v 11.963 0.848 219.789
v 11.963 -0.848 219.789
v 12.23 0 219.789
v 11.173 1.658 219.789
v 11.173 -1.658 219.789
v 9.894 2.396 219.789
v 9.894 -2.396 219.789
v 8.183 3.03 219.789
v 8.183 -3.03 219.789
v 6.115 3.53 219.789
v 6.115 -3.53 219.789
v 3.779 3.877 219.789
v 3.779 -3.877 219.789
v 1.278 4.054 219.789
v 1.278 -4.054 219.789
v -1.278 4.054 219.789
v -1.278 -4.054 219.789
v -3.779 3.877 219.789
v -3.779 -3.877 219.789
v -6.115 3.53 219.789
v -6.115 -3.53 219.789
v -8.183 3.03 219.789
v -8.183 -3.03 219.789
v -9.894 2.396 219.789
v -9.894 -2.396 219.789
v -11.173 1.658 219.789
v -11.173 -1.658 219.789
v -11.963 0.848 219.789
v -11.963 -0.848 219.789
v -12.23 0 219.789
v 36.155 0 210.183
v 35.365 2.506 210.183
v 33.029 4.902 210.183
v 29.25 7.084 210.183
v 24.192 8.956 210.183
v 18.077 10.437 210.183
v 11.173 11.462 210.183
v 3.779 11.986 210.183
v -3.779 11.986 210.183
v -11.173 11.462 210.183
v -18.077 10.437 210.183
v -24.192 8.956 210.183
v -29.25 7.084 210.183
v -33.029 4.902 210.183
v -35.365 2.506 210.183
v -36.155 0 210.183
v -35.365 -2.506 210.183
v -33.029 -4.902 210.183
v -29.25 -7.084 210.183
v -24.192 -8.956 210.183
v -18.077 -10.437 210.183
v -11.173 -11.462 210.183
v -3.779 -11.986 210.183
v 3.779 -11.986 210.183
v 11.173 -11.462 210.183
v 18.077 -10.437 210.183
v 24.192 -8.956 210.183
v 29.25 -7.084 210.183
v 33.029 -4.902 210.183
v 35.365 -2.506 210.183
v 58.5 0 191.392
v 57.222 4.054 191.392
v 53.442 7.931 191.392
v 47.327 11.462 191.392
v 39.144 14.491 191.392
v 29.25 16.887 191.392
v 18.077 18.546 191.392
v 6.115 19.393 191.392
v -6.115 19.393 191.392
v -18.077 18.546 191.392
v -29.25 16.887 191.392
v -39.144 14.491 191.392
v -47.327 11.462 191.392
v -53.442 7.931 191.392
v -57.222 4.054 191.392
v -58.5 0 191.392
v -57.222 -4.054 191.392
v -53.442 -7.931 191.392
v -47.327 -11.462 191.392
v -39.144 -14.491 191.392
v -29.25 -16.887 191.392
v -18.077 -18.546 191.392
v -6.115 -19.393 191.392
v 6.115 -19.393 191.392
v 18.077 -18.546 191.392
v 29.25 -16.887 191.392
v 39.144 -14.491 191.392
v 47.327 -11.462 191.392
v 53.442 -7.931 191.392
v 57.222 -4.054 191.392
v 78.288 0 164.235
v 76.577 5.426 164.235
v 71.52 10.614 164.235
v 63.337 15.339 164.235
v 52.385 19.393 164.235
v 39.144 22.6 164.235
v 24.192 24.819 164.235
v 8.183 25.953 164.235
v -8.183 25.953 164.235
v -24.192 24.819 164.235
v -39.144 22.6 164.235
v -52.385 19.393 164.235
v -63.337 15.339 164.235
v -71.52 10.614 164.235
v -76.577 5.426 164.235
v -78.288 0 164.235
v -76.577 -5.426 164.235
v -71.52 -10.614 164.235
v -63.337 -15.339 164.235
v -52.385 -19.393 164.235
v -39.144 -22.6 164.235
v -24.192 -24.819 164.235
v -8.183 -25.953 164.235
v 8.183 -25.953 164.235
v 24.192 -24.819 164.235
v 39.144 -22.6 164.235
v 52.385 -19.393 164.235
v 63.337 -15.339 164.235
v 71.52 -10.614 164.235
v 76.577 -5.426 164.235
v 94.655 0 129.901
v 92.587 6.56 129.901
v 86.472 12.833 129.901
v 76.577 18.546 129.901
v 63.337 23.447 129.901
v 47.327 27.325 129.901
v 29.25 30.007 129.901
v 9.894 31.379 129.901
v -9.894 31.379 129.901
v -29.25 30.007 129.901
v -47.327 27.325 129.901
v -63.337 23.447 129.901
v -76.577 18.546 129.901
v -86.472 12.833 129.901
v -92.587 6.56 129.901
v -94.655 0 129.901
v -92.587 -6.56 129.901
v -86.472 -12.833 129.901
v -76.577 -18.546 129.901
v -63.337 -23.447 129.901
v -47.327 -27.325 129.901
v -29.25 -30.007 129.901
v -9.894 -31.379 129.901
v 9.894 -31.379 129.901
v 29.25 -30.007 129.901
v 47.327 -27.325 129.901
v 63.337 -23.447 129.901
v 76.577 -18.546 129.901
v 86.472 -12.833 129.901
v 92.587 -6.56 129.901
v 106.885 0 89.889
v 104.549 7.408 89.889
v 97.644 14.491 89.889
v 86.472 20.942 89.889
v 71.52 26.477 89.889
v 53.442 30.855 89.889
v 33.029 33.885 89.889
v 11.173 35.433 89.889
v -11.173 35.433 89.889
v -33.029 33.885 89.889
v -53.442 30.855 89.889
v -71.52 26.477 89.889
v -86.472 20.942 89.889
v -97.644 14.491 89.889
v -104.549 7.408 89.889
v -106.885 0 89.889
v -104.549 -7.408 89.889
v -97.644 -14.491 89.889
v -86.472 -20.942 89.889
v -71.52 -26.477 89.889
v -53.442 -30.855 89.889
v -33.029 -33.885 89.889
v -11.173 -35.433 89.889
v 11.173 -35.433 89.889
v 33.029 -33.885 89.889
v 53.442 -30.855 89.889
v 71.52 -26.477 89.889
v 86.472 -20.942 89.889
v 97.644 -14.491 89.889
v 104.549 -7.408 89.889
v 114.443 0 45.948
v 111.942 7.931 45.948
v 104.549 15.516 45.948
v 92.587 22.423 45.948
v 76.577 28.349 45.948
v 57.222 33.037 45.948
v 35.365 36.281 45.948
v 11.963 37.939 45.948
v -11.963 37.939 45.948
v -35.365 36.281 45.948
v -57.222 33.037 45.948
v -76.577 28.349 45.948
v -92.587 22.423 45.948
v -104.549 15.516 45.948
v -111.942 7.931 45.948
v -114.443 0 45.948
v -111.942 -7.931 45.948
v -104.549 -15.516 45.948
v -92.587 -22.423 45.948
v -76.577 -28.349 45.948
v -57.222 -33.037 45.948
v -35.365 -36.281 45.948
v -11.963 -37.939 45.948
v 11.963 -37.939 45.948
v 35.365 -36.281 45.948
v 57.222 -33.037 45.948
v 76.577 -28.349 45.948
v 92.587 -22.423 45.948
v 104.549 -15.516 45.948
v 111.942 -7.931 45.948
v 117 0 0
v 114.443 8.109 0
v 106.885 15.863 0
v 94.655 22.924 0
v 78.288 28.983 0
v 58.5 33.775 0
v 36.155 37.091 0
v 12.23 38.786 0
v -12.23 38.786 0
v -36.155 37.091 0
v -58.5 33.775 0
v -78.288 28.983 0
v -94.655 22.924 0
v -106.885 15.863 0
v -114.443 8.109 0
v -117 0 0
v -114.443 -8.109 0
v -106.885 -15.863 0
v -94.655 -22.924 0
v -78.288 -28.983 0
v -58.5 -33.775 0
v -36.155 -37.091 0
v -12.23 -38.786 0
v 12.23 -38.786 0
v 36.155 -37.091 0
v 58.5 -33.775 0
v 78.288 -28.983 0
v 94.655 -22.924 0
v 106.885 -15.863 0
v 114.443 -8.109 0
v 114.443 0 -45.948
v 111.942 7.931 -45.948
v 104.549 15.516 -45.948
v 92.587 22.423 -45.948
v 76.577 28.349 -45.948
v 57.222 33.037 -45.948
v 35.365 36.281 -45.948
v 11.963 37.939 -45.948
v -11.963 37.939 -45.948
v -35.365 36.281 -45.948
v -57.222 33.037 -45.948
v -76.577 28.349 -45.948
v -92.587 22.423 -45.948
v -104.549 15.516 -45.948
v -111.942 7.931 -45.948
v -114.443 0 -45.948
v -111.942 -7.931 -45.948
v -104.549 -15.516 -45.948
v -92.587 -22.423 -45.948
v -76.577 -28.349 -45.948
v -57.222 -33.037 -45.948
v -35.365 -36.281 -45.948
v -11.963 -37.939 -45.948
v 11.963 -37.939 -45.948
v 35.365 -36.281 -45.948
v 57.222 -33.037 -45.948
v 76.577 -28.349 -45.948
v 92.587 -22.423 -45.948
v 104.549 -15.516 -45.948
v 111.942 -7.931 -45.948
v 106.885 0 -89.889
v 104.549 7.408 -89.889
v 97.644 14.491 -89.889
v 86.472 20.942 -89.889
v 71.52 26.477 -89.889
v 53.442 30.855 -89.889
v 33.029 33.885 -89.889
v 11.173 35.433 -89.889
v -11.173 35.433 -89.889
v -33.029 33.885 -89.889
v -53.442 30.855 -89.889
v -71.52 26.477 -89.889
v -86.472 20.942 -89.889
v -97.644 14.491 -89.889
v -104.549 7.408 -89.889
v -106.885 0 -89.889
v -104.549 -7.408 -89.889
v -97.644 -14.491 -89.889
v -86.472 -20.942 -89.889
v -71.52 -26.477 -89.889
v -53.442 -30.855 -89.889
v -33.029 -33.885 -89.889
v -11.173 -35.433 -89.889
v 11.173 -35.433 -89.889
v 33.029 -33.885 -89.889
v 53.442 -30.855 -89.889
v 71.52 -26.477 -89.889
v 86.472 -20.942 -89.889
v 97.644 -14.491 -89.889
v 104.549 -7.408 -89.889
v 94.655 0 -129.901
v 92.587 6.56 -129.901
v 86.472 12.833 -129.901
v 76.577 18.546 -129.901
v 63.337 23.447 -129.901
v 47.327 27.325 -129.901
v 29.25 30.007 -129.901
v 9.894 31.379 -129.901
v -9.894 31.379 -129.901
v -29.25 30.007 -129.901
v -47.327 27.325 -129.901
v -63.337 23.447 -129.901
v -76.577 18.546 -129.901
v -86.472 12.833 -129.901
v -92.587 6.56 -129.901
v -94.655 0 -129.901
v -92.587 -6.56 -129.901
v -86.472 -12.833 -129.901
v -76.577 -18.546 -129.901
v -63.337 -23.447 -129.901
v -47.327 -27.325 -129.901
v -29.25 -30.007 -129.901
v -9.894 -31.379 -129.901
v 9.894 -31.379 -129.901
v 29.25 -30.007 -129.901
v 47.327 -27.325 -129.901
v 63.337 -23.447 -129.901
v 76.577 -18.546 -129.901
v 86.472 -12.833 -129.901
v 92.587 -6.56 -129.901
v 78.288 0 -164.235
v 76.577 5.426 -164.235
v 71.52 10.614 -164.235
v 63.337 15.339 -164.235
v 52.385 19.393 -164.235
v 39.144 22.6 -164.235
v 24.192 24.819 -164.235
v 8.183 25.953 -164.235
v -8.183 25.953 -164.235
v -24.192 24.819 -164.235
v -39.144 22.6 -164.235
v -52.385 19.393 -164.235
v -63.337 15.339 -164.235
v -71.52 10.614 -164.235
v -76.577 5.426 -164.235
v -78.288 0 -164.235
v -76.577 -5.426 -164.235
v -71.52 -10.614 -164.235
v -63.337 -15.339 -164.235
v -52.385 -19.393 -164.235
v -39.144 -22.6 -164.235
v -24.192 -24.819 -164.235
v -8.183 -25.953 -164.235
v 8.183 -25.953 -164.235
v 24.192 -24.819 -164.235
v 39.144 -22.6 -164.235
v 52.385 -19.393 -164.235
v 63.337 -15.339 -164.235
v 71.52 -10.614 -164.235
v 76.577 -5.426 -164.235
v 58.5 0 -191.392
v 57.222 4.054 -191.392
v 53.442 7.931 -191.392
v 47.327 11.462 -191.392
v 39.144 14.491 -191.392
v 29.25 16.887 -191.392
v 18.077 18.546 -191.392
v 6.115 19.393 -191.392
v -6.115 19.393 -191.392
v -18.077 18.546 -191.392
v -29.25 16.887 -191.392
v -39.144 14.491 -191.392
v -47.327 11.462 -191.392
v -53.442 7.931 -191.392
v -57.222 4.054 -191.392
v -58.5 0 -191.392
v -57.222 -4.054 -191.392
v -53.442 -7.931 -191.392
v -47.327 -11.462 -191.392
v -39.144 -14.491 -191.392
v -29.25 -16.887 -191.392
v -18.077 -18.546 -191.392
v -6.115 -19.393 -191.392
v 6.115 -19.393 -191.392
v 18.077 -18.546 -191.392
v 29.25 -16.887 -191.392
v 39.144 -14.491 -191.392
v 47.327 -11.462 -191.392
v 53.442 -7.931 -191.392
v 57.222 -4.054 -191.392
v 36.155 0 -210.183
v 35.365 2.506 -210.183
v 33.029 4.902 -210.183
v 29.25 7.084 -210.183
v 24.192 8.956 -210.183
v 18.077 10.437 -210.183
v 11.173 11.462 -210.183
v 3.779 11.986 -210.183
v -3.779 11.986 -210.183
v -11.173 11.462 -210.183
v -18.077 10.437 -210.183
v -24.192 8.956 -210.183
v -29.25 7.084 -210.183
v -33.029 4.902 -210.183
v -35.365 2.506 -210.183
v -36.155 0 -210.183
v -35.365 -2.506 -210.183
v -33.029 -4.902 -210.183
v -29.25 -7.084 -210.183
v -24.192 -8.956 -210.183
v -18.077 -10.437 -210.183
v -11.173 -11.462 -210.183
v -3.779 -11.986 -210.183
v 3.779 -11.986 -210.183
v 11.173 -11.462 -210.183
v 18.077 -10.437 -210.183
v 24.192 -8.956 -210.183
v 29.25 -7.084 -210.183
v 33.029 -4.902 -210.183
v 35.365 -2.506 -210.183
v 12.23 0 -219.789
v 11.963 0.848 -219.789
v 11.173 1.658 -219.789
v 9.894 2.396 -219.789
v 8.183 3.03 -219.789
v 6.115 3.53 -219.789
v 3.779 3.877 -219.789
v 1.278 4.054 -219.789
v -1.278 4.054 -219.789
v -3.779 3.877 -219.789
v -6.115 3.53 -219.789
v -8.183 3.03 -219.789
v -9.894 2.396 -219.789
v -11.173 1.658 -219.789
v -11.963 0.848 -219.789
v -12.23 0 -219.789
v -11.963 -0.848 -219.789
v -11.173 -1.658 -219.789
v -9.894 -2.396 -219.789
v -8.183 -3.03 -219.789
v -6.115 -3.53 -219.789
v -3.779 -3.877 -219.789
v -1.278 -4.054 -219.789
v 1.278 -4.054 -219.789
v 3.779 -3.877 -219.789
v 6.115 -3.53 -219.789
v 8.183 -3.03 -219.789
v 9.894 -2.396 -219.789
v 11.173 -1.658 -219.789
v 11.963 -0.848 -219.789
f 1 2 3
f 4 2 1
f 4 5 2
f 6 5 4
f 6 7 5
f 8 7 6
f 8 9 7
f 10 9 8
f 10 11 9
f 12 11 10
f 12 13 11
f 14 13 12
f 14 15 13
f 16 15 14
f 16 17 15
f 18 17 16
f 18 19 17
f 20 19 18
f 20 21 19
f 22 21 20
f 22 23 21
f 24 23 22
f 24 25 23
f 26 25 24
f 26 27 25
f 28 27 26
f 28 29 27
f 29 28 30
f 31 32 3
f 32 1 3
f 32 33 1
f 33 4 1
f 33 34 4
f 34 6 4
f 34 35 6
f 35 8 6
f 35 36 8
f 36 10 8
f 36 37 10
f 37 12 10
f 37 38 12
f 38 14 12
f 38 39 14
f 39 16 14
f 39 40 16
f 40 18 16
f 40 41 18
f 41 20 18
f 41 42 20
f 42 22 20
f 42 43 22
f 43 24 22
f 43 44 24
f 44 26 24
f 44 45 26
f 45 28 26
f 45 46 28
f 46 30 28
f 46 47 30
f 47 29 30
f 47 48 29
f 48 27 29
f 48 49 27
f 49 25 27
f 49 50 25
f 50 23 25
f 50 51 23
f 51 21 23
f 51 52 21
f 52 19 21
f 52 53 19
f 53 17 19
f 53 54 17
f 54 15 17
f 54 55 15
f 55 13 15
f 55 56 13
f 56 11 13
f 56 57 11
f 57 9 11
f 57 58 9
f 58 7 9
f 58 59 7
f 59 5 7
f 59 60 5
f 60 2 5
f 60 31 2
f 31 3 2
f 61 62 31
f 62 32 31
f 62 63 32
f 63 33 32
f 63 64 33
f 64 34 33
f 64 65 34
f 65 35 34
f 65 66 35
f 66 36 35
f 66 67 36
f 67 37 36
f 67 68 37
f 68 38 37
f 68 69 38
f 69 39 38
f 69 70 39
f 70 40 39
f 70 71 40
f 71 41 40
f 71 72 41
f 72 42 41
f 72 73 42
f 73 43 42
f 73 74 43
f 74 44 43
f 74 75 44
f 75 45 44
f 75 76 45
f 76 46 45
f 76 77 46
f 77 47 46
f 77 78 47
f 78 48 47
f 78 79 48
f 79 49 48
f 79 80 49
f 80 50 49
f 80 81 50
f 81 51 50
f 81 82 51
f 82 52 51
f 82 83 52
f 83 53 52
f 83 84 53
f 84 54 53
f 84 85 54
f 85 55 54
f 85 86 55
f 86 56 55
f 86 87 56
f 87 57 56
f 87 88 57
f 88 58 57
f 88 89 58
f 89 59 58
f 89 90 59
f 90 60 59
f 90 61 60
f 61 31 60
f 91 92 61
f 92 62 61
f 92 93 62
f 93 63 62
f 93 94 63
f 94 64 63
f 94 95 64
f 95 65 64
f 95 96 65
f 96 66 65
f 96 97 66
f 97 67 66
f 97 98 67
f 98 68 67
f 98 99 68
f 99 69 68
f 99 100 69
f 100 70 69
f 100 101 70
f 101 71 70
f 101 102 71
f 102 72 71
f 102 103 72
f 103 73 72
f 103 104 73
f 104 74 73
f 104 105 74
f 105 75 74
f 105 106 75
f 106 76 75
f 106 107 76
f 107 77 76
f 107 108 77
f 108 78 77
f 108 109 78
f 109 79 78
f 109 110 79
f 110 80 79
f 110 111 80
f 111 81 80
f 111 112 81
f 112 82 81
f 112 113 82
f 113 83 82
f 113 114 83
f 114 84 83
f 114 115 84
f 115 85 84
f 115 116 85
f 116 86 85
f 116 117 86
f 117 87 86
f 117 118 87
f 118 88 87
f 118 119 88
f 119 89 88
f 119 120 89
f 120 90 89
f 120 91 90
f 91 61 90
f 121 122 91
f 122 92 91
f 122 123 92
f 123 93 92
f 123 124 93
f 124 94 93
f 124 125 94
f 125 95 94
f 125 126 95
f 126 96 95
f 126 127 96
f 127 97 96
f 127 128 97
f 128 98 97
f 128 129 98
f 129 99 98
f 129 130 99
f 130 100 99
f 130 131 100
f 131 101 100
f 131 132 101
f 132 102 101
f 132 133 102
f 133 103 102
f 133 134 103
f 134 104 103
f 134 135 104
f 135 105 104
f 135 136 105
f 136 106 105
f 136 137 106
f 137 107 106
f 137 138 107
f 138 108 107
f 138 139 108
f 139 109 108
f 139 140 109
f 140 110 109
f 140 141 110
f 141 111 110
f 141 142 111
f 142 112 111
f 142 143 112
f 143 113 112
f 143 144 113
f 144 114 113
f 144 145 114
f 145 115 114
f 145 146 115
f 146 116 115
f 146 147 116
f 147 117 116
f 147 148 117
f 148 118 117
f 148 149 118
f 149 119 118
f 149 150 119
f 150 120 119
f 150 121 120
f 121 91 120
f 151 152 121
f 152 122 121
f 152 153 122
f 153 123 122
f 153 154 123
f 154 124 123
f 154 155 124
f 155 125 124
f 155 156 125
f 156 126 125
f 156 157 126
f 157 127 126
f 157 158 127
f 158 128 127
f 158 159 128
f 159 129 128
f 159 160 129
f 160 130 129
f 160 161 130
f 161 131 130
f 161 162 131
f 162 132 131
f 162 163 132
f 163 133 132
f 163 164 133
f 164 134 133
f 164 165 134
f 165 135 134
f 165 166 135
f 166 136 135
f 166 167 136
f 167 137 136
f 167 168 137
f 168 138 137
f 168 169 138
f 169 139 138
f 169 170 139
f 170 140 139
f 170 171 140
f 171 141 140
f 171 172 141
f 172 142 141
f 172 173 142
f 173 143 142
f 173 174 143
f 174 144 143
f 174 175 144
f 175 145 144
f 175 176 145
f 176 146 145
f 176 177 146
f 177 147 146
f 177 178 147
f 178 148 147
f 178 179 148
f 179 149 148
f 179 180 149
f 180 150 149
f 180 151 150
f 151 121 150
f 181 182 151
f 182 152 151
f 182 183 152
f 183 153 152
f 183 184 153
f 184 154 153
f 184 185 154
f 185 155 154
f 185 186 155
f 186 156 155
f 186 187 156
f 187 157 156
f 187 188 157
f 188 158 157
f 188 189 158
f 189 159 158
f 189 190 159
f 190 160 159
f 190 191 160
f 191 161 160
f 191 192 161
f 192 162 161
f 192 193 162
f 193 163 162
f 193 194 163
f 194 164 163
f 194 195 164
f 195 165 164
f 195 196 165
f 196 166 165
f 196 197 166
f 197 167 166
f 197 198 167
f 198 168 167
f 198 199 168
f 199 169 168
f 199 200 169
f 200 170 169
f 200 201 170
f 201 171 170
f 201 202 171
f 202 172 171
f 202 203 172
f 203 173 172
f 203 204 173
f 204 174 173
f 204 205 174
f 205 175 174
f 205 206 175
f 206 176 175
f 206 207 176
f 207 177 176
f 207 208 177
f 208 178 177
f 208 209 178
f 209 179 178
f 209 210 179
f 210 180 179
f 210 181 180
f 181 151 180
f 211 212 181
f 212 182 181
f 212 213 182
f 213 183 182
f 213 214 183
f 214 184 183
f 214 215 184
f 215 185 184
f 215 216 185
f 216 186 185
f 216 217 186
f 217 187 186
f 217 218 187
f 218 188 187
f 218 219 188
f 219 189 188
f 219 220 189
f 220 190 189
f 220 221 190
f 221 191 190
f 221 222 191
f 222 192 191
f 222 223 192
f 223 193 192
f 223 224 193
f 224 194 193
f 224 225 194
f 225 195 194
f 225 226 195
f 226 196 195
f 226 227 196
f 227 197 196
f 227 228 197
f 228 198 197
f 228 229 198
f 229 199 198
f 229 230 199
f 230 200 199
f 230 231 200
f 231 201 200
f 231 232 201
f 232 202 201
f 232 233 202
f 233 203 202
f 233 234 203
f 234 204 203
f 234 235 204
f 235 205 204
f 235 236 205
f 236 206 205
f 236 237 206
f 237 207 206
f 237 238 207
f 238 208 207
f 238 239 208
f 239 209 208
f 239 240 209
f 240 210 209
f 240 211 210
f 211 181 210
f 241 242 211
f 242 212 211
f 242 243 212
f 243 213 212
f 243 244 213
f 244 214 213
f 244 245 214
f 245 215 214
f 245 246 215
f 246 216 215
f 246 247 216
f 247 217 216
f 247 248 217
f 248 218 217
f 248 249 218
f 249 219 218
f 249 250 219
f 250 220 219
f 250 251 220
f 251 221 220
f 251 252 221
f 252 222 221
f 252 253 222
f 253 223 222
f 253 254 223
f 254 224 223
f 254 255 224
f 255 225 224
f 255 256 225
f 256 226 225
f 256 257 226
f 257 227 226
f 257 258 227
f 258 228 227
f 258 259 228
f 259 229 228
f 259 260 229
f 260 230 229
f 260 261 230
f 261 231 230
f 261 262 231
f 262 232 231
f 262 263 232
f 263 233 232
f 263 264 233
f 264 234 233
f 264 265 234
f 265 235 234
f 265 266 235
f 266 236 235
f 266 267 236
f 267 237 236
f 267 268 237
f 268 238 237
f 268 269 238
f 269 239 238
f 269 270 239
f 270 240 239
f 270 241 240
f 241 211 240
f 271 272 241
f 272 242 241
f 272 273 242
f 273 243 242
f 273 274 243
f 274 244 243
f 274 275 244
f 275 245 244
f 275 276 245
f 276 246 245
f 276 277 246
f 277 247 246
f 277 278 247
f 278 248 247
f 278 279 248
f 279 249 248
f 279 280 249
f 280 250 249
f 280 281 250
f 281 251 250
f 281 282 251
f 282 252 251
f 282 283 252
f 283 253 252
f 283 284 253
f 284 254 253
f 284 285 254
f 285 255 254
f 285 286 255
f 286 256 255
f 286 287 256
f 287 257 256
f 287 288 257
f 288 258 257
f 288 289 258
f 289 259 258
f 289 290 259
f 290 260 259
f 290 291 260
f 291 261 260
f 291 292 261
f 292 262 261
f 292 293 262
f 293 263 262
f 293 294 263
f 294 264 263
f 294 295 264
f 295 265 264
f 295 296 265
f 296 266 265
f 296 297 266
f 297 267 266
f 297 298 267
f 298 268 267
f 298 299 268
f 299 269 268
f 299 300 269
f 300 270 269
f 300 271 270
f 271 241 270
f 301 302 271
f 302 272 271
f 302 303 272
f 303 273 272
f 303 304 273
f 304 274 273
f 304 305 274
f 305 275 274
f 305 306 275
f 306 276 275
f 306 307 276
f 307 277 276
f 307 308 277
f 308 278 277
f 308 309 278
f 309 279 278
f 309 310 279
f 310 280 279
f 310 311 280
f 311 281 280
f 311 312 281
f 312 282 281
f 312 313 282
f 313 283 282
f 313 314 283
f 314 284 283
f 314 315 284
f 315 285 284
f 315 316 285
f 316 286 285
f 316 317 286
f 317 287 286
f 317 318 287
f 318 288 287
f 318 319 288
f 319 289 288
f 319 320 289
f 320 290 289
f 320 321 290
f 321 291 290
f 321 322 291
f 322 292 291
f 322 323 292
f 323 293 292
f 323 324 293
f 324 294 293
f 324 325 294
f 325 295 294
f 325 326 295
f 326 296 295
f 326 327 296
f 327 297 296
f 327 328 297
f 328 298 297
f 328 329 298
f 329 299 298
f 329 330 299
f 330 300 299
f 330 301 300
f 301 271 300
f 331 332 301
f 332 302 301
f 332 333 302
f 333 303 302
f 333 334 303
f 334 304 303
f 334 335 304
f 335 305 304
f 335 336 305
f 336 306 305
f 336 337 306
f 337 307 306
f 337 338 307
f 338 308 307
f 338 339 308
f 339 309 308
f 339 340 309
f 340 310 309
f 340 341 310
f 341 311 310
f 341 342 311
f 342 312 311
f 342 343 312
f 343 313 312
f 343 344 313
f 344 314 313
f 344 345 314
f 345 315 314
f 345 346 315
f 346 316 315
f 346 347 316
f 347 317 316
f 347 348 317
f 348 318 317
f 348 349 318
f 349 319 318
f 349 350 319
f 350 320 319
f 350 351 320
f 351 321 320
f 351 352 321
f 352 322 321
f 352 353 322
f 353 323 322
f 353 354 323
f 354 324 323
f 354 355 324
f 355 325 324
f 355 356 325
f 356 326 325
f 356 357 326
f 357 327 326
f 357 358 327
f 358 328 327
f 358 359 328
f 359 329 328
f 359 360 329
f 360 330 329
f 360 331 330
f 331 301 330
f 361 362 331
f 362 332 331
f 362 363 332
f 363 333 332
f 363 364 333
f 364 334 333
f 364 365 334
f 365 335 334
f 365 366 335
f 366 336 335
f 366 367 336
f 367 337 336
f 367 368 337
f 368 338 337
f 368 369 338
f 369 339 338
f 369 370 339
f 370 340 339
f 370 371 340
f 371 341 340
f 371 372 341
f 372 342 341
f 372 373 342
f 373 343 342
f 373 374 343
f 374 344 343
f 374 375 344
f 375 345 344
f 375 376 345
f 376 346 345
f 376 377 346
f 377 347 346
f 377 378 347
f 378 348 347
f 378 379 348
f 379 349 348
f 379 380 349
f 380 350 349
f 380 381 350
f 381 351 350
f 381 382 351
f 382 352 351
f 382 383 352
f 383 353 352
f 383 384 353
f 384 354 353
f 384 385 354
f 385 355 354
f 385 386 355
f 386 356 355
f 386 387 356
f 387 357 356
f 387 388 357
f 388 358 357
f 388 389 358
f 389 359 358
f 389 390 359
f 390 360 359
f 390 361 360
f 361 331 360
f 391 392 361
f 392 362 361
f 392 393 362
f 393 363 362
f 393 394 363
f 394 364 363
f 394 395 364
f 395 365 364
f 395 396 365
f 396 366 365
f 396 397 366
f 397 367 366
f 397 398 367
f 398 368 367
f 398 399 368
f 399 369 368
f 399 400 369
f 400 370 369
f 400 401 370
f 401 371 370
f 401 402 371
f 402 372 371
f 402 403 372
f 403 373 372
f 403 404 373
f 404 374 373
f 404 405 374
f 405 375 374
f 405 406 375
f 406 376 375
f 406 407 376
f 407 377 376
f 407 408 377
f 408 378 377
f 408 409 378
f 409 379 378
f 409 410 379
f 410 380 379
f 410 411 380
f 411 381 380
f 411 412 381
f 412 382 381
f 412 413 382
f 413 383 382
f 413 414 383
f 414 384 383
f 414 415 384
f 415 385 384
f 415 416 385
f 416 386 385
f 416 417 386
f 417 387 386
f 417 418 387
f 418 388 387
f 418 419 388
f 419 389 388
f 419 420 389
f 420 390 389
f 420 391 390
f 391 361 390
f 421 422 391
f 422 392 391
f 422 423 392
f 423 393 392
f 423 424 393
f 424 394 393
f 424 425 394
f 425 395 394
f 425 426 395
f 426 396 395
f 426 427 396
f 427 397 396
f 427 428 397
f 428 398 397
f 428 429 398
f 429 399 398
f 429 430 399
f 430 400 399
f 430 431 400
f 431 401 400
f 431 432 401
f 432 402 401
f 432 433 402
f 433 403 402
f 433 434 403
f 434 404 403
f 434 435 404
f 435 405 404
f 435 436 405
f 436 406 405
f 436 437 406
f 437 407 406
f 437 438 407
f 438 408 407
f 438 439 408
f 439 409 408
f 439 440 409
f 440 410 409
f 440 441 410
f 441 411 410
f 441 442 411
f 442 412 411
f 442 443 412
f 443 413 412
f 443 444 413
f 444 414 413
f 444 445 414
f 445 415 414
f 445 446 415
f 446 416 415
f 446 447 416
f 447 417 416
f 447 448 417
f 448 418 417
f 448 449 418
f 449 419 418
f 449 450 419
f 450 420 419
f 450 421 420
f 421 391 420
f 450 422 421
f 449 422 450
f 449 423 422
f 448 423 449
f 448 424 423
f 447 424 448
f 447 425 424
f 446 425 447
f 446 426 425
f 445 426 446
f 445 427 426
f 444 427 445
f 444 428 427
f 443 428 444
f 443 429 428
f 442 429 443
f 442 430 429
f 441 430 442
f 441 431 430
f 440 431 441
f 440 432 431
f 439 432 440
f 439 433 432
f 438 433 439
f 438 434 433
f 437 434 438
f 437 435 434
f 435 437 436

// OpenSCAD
// Generated by SolidPython 1.0.1 on 2020-07-29 00:46:48


scale(v = [9, 3, 17]) {
	sphere(r = 13);
}
/***********************************************
*********      SolidPython code:      **********
************************************************
 
# import packages: SolidPython
from solid import *
from solid.utils import *
from itertools import chain, combinations, permutations


class Resize:

    def __init__(self, scad_file):
        self.scad_file = scad_file
        #self.scad_file = import_scad(scad_file)
        # cone/cylinder param:
        self.r1 = 0
        self.r2 = 0
        self.h = 0
        # rectangular prism param:
        self.w = 0
        self.l = 0
        # ellipse param:
        self.r = 0

    # import OpenScad code (file name corresponds to shape)


    # classify shape + parameters
    def assign(self, param1, param2, param3):
        if self.scad_file == 'cone.scad':
            self.r1 = param1
            self.r2 = param2
            self.h = param3
        elif self.scad_file == 'cylinder.scad':
            self.r1 = param1
            self.r2 = param2
            self.h = param3
        elif self.scad_file == 'rectangularPrism.scad':
            self.h = param1
            self.l = param2
            self.w = param3
        else:
            self.r = param1
            self.h = param2

    # resize parameters
    def iterate(self):
        x = range(3, 20, 2)
        i = 1
        if self.scad_file == 'cone.scad':
            tempList = list(permutations(x, 2))
            for temp in tempList:
                param1 = temp[0]
                param2 = temp[1]
                filepath = 'produced_scad_files/' + 'cone' + str(param1) + '_' + str(param2) + '_' + '.scad'
                scad_render_to_file(cylinder(h=param1, r1=param2, r2=0), filepath)

        elif self.scad_file == 'cylinder.scad':
            tempList = list(permutations(x, 3))
            for temp in tempList:
                param1 = temp[0]
                param2 = temp[1]
                filepath = 'produced_scad_files/' + 'cylinder' + str(param1) + '_' + str(param2) + '_' + '.scad'
                scad_render_to_file(cylinder(h=param1, r1=param2, r2=param2), filepath)

        elif self.scad_file == 'rectangularPrism.scad':
            tempList = list(permutations(x, 3))
            for temp in tempList:
                param1 = temp[0]
                param2 = temp[1]
                param3 = temp[2]
                filepath = 'produced_scad_files/' + 'rectangularPrism' + str(param1) + '_' + str(param2) + '_' + str(
                    param3) + '.scad'
                scad_render_to_file(cube(size=(param1, param2, param3)), filepath)

        elif self.scad_file == 'ellipse.scad':
            tempList = list(permutations(x, 4))
            for temp in tempList:
                param1 = temp[0]
                param2 = temp[1]
                param3 = temp[2]
                param4 = temp[3]
                filepath = 'produced_scad_files/' + 'ellipse' + str(param1) + '_' + str(param2) + '_' + str(param3) + '_' + str(param4) + '.scad'
                scad_render_to_file(scale([param1, param2, param3])(sphere(r=param4)), filepath)

    def render_to_scadfile(self):
        scad_render_to_file(scad, 'example.scad') 
 
************************************************/
